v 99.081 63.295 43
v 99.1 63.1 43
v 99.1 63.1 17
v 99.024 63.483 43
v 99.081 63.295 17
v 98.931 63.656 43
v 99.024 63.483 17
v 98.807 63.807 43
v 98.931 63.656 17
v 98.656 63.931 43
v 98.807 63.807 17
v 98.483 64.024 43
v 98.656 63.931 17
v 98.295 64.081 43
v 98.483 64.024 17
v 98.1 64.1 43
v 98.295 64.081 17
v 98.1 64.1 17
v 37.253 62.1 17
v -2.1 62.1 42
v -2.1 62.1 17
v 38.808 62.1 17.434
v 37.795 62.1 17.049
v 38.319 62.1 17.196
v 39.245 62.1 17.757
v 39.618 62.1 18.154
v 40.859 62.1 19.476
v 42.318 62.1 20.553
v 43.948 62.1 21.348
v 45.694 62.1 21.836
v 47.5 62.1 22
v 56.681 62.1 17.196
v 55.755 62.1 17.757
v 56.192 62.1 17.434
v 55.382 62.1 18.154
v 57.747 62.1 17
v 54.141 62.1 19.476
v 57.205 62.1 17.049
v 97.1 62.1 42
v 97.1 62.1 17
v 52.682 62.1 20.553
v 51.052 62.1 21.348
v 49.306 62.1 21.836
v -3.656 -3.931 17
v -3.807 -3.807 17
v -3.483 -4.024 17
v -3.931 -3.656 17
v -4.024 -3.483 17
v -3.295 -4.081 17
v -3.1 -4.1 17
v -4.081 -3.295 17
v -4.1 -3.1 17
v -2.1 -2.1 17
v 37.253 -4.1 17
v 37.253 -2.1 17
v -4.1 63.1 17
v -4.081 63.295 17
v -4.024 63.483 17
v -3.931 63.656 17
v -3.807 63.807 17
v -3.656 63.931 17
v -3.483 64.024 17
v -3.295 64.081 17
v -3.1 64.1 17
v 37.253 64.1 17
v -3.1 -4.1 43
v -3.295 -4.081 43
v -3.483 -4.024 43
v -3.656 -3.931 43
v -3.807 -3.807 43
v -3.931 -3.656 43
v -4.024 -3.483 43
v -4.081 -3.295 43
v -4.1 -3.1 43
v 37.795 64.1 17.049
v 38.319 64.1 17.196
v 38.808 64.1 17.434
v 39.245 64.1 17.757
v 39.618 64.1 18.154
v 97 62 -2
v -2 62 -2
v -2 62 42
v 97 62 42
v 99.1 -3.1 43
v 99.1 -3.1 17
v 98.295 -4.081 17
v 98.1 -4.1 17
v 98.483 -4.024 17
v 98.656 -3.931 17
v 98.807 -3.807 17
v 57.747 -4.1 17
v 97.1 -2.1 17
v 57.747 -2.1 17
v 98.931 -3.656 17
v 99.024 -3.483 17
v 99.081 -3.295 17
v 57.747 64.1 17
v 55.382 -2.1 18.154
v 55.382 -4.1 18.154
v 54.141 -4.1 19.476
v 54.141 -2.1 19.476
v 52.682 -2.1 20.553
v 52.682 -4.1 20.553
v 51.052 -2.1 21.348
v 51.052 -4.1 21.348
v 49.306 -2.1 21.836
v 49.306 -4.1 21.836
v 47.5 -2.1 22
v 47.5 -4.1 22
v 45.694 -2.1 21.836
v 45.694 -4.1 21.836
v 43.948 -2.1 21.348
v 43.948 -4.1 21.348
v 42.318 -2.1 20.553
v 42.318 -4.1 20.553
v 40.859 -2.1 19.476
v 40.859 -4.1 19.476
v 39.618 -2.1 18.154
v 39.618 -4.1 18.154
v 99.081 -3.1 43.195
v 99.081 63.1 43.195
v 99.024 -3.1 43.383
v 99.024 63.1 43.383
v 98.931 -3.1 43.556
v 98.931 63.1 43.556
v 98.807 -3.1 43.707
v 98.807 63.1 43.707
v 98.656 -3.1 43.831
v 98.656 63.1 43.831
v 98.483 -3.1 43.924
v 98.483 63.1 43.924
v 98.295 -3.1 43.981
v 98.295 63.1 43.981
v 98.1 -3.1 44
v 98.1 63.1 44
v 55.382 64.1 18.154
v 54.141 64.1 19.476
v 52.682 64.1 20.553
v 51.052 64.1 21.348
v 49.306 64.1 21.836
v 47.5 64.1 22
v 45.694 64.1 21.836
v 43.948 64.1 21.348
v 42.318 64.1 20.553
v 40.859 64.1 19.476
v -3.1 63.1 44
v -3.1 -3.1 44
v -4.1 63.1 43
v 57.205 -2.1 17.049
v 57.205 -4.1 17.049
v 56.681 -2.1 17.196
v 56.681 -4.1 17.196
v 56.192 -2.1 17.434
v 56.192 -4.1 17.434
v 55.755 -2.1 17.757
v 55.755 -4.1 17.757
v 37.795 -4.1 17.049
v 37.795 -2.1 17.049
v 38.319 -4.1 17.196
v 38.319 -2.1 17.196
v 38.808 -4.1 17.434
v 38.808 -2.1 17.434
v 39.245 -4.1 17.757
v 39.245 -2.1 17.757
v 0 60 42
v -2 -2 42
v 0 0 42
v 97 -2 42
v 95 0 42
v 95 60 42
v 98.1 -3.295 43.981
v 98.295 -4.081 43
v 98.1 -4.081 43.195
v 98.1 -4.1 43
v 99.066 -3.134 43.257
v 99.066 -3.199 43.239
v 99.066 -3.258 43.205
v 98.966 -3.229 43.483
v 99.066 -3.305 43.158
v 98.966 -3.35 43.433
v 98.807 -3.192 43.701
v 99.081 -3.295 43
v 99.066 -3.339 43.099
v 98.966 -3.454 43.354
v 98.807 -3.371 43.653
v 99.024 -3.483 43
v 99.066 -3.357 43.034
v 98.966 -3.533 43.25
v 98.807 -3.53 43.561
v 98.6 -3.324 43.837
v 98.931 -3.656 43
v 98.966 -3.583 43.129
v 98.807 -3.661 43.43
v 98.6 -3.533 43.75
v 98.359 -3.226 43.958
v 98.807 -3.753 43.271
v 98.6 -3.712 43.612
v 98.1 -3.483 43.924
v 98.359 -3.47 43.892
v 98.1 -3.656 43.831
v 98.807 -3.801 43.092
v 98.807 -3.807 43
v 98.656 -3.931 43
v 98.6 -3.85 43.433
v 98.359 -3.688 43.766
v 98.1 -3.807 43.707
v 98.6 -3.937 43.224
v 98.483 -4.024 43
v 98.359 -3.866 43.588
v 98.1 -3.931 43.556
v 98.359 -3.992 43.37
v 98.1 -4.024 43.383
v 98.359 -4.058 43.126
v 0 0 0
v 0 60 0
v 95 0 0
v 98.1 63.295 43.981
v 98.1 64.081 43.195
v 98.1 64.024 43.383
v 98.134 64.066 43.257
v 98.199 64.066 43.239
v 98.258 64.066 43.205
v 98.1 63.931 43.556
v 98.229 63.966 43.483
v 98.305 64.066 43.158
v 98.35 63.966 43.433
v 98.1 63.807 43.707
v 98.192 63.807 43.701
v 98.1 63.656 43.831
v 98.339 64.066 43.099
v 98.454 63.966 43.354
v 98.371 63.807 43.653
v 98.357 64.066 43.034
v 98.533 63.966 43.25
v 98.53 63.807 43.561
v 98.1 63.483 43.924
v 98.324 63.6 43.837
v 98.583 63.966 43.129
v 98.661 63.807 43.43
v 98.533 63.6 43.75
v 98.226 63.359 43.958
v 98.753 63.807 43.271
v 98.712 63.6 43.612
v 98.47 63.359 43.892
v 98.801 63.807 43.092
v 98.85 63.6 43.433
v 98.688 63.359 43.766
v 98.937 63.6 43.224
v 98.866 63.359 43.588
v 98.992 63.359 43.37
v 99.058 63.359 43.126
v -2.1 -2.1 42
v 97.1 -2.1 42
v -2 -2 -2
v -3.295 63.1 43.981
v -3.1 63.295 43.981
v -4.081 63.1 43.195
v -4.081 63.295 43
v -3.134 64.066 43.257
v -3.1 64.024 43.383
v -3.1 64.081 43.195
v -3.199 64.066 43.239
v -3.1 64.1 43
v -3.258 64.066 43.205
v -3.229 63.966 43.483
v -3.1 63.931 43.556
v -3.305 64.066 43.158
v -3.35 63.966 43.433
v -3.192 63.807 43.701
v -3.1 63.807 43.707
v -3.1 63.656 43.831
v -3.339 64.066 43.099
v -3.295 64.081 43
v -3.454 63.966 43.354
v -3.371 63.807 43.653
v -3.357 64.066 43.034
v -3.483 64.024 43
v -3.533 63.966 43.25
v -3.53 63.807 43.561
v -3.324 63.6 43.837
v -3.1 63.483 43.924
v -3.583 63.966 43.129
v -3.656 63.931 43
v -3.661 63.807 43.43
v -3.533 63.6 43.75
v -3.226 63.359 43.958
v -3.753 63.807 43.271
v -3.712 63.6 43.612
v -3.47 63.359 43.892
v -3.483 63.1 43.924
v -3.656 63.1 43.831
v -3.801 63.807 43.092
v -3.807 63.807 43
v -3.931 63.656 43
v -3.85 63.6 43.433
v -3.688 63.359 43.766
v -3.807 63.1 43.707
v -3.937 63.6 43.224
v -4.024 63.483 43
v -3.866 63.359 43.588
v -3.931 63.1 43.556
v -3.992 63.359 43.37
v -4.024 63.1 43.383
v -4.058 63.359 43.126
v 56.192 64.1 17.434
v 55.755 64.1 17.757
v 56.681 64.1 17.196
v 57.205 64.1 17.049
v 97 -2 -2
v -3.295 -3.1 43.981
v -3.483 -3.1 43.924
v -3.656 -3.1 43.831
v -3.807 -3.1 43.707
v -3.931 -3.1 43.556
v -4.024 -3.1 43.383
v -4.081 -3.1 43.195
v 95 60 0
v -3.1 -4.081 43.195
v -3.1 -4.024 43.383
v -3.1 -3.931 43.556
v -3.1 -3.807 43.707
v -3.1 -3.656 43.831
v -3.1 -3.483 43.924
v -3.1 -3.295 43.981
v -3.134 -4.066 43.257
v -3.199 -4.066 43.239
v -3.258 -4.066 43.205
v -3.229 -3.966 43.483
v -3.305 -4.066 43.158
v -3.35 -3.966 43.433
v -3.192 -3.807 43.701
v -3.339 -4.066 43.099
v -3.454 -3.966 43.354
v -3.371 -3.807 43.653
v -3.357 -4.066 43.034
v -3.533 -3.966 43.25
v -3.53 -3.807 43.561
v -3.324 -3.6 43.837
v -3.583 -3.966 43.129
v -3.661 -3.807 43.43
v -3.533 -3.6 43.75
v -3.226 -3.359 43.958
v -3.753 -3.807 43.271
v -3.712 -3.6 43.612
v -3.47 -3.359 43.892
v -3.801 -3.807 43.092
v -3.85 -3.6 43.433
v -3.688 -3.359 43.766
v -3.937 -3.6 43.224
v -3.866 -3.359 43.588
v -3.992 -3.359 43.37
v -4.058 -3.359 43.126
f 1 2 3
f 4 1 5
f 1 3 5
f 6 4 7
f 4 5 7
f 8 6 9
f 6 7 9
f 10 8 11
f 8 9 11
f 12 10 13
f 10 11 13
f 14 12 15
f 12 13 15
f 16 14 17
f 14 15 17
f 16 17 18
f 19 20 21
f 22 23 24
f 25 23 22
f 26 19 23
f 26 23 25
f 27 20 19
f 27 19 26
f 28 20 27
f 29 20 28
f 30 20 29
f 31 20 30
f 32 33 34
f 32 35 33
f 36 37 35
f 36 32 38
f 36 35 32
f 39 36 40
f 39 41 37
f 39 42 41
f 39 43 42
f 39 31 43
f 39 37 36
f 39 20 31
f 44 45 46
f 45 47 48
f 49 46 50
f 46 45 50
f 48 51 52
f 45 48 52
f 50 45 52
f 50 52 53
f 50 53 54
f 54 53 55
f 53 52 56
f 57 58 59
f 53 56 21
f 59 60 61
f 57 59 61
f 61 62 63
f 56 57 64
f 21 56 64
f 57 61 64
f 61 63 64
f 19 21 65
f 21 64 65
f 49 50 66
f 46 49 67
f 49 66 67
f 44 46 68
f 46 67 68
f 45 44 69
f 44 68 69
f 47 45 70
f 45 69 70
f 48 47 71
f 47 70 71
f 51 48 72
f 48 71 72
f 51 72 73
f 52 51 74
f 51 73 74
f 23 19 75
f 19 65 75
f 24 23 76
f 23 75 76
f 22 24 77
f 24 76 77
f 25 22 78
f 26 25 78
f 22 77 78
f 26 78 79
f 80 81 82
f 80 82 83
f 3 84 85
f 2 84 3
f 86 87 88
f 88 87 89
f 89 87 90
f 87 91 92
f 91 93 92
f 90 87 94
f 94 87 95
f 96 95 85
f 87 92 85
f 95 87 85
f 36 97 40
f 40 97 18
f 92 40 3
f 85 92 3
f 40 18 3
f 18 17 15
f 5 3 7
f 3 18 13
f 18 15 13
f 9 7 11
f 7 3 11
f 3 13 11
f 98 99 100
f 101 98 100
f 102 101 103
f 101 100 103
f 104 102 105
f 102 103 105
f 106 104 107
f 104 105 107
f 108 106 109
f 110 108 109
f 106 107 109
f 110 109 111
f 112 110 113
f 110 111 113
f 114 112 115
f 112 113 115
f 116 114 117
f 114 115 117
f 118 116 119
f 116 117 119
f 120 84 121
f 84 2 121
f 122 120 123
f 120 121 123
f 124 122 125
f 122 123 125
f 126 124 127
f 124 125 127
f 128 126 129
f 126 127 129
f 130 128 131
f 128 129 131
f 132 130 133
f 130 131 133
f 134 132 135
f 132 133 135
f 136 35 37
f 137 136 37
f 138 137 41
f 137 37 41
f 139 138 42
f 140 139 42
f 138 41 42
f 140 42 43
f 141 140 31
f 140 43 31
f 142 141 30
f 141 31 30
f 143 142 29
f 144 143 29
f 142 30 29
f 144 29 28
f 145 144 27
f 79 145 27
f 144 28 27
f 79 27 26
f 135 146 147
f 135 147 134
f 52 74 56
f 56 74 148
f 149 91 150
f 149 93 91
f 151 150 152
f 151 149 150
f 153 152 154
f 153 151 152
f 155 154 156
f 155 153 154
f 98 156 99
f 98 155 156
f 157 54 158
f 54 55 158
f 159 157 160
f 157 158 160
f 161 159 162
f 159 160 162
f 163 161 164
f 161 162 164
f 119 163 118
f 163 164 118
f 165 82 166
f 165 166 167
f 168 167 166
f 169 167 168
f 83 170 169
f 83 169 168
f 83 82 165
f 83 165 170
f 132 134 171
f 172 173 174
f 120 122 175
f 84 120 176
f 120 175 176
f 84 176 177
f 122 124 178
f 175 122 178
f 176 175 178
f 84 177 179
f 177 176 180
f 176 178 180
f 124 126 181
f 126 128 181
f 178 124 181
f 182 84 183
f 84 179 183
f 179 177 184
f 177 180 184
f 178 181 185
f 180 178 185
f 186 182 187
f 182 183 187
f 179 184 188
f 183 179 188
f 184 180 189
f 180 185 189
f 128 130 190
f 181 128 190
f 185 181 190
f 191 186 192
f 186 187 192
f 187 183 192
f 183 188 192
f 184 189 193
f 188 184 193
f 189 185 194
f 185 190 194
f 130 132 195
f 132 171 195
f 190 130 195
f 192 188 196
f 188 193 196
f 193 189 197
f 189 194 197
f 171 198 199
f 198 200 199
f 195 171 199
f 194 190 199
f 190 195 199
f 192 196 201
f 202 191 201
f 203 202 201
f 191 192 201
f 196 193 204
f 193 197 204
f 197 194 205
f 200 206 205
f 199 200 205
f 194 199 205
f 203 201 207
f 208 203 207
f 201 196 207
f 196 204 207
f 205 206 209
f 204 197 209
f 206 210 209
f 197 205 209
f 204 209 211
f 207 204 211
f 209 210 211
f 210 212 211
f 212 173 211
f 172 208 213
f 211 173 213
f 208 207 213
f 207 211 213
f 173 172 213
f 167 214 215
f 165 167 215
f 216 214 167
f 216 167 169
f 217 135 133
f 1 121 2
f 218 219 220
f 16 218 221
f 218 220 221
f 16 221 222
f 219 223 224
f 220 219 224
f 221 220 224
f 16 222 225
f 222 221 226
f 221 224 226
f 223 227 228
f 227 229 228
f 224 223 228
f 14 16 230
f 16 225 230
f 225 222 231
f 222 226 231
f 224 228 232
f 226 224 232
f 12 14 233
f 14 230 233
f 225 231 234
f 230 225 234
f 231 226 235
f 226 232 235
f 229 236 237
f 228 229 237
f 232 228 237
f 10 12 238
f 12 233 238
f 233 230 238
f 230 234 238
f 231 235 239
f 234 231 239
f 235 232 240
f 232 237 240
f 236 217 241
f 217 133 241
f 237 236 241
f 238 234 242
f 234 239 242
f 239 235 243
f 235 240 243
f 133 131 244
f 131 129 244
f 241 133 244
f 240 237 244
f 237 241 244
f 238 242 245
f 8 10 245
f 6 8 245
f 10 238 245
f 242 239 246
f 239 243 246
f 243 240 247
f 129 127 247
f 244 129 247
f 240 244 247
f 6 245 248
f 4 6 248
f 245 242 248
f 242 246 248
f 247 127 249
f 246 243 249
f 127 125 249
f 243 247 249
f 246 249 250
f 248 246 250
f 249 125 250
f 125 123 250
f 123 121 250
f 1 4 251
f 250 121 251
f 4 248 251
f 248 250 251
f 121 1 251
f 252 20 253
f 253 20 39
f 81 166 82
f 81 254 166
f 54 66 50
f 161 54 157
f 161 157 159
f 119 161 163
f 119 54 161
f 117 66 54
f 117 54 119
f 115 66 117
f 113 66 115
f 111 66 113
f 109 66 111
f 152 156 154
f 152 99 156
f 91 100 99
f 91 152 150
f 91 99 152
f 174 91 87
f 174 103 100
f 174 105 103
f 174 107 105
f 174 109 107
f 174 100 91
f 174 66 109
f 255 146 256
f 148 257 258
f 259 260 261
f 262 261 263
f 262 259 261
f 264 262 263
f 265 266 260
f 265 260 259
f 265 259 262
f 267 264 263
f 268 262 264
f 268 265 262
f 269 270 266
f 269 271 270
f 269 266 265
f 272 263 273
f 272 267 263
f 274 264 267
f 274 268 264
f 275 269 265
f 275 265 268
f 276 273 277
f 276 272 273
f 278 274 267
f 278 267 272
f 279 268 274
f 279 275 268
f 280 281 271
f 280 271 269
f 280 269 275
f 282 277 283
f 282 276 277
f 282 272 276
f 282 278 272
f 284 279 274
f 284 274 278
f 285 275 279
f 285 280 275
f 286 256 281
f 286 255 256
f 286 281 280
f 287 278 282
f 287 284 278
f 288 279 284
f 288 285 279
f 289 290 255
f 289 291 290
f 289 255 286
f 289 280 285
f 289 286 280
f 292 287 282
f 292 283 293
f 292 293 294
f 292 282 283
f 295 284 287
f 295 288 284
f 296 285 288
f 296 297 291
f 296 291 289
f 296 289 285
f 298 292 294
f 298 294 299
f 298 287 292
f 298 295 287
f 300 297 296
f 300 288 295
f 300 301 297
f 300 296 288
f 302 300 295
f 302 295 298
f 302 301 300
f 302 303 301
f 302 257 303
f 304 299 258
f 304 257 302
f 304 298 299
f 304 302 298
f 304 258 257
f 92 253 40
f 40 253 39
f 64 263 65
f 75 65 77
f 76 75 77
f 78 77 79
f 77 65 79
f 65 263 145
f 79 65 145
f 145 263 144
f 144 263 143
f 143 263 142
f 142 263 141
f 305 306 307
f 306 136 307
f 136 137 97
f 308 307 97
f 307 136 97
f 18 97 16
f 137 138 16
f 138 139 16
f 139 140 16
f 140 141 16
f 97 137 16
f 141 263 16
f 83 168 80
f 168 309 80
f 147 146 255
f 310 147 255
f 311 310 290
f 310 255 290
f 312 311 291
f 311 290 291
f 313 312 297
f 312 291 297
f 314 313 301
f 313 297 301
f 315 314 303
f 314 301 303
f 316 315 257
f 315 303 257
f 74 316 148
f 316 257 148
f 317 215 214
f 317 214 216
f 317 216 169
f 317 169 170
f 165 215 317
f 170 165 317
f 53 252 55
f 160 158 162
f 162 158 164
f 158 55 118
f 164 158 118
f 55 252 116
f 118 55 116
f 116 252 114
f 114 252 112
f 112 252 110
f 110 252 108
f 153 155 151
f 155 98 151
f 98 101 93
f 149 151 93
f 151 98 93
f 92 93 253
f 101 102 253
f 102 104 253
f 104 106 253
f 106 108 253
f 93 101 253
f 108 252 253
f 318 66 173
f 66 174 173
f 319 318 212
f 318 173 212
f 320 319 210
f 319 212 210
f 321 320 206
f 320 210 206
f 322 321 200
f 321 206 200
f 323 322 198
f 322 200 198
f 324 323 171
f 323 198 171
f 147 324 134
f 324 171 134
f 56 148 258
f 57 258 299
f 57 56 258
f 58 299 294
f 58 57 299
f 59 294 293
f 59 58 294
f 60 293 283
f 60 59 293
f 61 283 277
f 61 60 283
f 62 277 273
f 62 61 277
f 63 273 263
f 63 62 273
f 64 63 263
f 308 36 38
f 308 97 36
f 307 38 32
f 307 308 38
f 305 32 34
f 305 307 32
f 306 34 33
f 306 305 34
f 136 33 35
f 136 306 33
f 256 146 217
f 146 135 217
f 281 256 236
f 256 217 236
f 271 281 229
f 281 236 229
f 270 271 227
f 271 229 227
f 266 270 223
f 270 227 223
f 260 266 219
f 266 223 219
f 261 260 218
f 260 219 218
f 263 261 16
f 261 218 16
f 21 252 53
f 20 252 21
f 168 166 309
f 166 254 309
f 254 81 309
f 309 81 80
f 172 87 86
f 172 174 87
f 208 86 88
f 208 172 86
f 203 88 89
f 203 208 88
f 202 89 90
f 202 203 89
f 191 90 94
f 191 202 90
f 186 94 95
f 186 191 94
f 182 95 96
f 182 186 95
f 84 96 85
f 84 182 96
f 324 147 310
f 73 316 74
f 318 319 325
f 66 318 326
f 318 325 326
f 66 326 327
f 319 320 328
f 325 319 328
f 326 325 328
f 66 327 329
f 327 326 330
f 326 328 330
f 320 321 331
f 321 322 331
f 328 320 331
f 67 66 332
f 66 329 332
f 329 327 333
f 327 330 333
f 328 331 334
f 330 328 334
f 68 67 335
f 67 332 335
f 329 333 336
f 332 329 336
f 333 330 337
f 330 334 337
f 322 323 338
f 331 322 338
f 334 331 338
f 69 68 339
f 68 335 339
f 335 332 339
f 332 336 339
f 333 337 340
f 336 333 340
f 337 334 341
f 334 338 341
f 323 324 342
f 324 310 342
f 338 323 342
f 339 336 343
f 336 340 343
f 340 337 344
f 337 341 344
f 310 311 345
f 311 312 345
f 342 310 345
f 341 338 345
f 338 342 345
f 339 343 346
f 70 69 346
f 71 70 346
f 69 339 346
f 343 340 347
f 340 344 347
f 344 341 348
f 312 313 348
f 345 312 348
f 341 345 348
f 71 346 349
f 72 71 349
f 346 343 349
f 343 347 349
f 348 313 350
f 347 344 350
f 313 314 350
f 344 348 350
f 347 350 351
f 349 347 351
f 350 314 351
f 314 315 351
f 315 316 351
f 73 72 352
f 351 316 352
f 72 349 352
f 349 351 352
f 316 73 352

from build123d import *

# Parameters (mm, degrees)
F0_W     = 99
F0_H     = 64
F0_W_2   = 95
F0_H_2   = 60
F1_DEPTH = 2
F2_DEPTH = 42
F3_W     = 103.2
F3_H     = 68.2
F3_W_2   = 99.2
F3_H_2   = 64.2
F3_W_3   = 99
F3_H_3   = 64
F3_W_4   = 95
F3_H_4   = 60
F4_DEPTH = 2
F5_DEPTH = 25
F7_DEPTH = 68.201
F8_R     = 3
F9_R     = 1


with BuildPart() as f1:
    # F0 (on Top) → F1 (new body)
    with BuildSketch(Plane.XY):
        with Locations((47.5, 30)):
            Rectangle(F0_W, F0_H)
        with Locations((47.5, 30)):
            Rectangle(F0_W_2, F0_H_2, mode=Mode.SUBTRACT)
        with Locations((47.5, 30)):
            Rectangle(F0_W_2, F0_H_2)
    extrude(amount=-F1_DEPTH)

    # F0 (on Top) → F2 (join)
    with BuildSketch(Plane.XY):
        with Locations((47.5, 30)):
            Rectangle(F0_W, F0_H)
        with Locations((47.5, 30)):
            Rectangle(F0_W_2, F0_H_2, mode=Mode.SUBTRACT)
    extrude(amount=F2_DEPTH)


with BuildPart() as f4:
    # F3 (on face) → F4 (new body)
    with BuildSketch(Plane.XY.offset(42)):
        with Locations((47.5, 30)):
            Rectangle(F3_W, F3_H)
        with Locations((47.5, 30)):
            Rectangle(F3_W_2, F3_H_2, mode=Mode.SUBTRACT)
        with Locations((47.5, 30)):
            Rectangle(F3_W_2, F3_H_2)
        with Locations((47.5, 30)):
            Rectangle(F3_W_3, F3_H_3, mode=Mode.SUBTRACT)
        with Locations((47.5, 30)):
            Rectangle(F3_W_3, F3_H_3)
        with Locations((47.5, 30)):
            Rectangle(F3_W_4, F3_H_4, mode=Mode.SUBTRACT)
        with Locations((47.5, 30)):
            Rectangle(F3_W_4, F3_H_4)
    extrude(amount=F4_DEPTH)

    # F3 (on face) → F5 (join)
    with BuildSketch(Plane.XY.offset(42)):
        with Locations((47.5, 30)):
            Rectangle(F3_W, F3_H)
        with Locations((47.5, 30)):
            Rectangle(F3_W_2, F3_H_2, mode=Mode.SUBTRACT)
    extrude(amount=-F5_DEPTH)

    # F6 (on face) → F7 (cut, through all)
    with BuildSketch(Plane.XZ.offset(4.1)):
        with BuildLine():
            Line((38.8397459622, 17), (56.1602540378, 17))
            ThreePointArc((56.1602540378, 17), (47.5, 22), (38.8397459622, 17))
        make_face()
    extrude(amount=-F7_DEPTH, mode=Mode.SUBTRACT)

    # F8
    f8_edges = [f4.edges().sort_by_distance(p)[0] for p in [
        (38.839746, -3.1, 17),
        (56.160254, -3.1, 17),
        (38.839746, 63.1, 17),
        (56.160254, 63.1, 17),
    ]]
    fillet(f8_edges, radius=F8_R)

    # F9
    f9_edges = [f4.edges().sort_by_distance(p)[0] for p in [
        (-4.1, 30, 44),
        (47.5, -4.1, 44),
        (99.1, 30, 44),
        (47.5, 64.1, 44),
        (99.1, -4.1, 30.5),
        (99.1, 64.1, 30.5),
        (-4.1, 64.1, 30.5),
        (-4.1, -4.1, 30.5),
    ]]
    fillet(f9_edges, radius=F9_R)


solid = Compound([f1.part, f4.part])
